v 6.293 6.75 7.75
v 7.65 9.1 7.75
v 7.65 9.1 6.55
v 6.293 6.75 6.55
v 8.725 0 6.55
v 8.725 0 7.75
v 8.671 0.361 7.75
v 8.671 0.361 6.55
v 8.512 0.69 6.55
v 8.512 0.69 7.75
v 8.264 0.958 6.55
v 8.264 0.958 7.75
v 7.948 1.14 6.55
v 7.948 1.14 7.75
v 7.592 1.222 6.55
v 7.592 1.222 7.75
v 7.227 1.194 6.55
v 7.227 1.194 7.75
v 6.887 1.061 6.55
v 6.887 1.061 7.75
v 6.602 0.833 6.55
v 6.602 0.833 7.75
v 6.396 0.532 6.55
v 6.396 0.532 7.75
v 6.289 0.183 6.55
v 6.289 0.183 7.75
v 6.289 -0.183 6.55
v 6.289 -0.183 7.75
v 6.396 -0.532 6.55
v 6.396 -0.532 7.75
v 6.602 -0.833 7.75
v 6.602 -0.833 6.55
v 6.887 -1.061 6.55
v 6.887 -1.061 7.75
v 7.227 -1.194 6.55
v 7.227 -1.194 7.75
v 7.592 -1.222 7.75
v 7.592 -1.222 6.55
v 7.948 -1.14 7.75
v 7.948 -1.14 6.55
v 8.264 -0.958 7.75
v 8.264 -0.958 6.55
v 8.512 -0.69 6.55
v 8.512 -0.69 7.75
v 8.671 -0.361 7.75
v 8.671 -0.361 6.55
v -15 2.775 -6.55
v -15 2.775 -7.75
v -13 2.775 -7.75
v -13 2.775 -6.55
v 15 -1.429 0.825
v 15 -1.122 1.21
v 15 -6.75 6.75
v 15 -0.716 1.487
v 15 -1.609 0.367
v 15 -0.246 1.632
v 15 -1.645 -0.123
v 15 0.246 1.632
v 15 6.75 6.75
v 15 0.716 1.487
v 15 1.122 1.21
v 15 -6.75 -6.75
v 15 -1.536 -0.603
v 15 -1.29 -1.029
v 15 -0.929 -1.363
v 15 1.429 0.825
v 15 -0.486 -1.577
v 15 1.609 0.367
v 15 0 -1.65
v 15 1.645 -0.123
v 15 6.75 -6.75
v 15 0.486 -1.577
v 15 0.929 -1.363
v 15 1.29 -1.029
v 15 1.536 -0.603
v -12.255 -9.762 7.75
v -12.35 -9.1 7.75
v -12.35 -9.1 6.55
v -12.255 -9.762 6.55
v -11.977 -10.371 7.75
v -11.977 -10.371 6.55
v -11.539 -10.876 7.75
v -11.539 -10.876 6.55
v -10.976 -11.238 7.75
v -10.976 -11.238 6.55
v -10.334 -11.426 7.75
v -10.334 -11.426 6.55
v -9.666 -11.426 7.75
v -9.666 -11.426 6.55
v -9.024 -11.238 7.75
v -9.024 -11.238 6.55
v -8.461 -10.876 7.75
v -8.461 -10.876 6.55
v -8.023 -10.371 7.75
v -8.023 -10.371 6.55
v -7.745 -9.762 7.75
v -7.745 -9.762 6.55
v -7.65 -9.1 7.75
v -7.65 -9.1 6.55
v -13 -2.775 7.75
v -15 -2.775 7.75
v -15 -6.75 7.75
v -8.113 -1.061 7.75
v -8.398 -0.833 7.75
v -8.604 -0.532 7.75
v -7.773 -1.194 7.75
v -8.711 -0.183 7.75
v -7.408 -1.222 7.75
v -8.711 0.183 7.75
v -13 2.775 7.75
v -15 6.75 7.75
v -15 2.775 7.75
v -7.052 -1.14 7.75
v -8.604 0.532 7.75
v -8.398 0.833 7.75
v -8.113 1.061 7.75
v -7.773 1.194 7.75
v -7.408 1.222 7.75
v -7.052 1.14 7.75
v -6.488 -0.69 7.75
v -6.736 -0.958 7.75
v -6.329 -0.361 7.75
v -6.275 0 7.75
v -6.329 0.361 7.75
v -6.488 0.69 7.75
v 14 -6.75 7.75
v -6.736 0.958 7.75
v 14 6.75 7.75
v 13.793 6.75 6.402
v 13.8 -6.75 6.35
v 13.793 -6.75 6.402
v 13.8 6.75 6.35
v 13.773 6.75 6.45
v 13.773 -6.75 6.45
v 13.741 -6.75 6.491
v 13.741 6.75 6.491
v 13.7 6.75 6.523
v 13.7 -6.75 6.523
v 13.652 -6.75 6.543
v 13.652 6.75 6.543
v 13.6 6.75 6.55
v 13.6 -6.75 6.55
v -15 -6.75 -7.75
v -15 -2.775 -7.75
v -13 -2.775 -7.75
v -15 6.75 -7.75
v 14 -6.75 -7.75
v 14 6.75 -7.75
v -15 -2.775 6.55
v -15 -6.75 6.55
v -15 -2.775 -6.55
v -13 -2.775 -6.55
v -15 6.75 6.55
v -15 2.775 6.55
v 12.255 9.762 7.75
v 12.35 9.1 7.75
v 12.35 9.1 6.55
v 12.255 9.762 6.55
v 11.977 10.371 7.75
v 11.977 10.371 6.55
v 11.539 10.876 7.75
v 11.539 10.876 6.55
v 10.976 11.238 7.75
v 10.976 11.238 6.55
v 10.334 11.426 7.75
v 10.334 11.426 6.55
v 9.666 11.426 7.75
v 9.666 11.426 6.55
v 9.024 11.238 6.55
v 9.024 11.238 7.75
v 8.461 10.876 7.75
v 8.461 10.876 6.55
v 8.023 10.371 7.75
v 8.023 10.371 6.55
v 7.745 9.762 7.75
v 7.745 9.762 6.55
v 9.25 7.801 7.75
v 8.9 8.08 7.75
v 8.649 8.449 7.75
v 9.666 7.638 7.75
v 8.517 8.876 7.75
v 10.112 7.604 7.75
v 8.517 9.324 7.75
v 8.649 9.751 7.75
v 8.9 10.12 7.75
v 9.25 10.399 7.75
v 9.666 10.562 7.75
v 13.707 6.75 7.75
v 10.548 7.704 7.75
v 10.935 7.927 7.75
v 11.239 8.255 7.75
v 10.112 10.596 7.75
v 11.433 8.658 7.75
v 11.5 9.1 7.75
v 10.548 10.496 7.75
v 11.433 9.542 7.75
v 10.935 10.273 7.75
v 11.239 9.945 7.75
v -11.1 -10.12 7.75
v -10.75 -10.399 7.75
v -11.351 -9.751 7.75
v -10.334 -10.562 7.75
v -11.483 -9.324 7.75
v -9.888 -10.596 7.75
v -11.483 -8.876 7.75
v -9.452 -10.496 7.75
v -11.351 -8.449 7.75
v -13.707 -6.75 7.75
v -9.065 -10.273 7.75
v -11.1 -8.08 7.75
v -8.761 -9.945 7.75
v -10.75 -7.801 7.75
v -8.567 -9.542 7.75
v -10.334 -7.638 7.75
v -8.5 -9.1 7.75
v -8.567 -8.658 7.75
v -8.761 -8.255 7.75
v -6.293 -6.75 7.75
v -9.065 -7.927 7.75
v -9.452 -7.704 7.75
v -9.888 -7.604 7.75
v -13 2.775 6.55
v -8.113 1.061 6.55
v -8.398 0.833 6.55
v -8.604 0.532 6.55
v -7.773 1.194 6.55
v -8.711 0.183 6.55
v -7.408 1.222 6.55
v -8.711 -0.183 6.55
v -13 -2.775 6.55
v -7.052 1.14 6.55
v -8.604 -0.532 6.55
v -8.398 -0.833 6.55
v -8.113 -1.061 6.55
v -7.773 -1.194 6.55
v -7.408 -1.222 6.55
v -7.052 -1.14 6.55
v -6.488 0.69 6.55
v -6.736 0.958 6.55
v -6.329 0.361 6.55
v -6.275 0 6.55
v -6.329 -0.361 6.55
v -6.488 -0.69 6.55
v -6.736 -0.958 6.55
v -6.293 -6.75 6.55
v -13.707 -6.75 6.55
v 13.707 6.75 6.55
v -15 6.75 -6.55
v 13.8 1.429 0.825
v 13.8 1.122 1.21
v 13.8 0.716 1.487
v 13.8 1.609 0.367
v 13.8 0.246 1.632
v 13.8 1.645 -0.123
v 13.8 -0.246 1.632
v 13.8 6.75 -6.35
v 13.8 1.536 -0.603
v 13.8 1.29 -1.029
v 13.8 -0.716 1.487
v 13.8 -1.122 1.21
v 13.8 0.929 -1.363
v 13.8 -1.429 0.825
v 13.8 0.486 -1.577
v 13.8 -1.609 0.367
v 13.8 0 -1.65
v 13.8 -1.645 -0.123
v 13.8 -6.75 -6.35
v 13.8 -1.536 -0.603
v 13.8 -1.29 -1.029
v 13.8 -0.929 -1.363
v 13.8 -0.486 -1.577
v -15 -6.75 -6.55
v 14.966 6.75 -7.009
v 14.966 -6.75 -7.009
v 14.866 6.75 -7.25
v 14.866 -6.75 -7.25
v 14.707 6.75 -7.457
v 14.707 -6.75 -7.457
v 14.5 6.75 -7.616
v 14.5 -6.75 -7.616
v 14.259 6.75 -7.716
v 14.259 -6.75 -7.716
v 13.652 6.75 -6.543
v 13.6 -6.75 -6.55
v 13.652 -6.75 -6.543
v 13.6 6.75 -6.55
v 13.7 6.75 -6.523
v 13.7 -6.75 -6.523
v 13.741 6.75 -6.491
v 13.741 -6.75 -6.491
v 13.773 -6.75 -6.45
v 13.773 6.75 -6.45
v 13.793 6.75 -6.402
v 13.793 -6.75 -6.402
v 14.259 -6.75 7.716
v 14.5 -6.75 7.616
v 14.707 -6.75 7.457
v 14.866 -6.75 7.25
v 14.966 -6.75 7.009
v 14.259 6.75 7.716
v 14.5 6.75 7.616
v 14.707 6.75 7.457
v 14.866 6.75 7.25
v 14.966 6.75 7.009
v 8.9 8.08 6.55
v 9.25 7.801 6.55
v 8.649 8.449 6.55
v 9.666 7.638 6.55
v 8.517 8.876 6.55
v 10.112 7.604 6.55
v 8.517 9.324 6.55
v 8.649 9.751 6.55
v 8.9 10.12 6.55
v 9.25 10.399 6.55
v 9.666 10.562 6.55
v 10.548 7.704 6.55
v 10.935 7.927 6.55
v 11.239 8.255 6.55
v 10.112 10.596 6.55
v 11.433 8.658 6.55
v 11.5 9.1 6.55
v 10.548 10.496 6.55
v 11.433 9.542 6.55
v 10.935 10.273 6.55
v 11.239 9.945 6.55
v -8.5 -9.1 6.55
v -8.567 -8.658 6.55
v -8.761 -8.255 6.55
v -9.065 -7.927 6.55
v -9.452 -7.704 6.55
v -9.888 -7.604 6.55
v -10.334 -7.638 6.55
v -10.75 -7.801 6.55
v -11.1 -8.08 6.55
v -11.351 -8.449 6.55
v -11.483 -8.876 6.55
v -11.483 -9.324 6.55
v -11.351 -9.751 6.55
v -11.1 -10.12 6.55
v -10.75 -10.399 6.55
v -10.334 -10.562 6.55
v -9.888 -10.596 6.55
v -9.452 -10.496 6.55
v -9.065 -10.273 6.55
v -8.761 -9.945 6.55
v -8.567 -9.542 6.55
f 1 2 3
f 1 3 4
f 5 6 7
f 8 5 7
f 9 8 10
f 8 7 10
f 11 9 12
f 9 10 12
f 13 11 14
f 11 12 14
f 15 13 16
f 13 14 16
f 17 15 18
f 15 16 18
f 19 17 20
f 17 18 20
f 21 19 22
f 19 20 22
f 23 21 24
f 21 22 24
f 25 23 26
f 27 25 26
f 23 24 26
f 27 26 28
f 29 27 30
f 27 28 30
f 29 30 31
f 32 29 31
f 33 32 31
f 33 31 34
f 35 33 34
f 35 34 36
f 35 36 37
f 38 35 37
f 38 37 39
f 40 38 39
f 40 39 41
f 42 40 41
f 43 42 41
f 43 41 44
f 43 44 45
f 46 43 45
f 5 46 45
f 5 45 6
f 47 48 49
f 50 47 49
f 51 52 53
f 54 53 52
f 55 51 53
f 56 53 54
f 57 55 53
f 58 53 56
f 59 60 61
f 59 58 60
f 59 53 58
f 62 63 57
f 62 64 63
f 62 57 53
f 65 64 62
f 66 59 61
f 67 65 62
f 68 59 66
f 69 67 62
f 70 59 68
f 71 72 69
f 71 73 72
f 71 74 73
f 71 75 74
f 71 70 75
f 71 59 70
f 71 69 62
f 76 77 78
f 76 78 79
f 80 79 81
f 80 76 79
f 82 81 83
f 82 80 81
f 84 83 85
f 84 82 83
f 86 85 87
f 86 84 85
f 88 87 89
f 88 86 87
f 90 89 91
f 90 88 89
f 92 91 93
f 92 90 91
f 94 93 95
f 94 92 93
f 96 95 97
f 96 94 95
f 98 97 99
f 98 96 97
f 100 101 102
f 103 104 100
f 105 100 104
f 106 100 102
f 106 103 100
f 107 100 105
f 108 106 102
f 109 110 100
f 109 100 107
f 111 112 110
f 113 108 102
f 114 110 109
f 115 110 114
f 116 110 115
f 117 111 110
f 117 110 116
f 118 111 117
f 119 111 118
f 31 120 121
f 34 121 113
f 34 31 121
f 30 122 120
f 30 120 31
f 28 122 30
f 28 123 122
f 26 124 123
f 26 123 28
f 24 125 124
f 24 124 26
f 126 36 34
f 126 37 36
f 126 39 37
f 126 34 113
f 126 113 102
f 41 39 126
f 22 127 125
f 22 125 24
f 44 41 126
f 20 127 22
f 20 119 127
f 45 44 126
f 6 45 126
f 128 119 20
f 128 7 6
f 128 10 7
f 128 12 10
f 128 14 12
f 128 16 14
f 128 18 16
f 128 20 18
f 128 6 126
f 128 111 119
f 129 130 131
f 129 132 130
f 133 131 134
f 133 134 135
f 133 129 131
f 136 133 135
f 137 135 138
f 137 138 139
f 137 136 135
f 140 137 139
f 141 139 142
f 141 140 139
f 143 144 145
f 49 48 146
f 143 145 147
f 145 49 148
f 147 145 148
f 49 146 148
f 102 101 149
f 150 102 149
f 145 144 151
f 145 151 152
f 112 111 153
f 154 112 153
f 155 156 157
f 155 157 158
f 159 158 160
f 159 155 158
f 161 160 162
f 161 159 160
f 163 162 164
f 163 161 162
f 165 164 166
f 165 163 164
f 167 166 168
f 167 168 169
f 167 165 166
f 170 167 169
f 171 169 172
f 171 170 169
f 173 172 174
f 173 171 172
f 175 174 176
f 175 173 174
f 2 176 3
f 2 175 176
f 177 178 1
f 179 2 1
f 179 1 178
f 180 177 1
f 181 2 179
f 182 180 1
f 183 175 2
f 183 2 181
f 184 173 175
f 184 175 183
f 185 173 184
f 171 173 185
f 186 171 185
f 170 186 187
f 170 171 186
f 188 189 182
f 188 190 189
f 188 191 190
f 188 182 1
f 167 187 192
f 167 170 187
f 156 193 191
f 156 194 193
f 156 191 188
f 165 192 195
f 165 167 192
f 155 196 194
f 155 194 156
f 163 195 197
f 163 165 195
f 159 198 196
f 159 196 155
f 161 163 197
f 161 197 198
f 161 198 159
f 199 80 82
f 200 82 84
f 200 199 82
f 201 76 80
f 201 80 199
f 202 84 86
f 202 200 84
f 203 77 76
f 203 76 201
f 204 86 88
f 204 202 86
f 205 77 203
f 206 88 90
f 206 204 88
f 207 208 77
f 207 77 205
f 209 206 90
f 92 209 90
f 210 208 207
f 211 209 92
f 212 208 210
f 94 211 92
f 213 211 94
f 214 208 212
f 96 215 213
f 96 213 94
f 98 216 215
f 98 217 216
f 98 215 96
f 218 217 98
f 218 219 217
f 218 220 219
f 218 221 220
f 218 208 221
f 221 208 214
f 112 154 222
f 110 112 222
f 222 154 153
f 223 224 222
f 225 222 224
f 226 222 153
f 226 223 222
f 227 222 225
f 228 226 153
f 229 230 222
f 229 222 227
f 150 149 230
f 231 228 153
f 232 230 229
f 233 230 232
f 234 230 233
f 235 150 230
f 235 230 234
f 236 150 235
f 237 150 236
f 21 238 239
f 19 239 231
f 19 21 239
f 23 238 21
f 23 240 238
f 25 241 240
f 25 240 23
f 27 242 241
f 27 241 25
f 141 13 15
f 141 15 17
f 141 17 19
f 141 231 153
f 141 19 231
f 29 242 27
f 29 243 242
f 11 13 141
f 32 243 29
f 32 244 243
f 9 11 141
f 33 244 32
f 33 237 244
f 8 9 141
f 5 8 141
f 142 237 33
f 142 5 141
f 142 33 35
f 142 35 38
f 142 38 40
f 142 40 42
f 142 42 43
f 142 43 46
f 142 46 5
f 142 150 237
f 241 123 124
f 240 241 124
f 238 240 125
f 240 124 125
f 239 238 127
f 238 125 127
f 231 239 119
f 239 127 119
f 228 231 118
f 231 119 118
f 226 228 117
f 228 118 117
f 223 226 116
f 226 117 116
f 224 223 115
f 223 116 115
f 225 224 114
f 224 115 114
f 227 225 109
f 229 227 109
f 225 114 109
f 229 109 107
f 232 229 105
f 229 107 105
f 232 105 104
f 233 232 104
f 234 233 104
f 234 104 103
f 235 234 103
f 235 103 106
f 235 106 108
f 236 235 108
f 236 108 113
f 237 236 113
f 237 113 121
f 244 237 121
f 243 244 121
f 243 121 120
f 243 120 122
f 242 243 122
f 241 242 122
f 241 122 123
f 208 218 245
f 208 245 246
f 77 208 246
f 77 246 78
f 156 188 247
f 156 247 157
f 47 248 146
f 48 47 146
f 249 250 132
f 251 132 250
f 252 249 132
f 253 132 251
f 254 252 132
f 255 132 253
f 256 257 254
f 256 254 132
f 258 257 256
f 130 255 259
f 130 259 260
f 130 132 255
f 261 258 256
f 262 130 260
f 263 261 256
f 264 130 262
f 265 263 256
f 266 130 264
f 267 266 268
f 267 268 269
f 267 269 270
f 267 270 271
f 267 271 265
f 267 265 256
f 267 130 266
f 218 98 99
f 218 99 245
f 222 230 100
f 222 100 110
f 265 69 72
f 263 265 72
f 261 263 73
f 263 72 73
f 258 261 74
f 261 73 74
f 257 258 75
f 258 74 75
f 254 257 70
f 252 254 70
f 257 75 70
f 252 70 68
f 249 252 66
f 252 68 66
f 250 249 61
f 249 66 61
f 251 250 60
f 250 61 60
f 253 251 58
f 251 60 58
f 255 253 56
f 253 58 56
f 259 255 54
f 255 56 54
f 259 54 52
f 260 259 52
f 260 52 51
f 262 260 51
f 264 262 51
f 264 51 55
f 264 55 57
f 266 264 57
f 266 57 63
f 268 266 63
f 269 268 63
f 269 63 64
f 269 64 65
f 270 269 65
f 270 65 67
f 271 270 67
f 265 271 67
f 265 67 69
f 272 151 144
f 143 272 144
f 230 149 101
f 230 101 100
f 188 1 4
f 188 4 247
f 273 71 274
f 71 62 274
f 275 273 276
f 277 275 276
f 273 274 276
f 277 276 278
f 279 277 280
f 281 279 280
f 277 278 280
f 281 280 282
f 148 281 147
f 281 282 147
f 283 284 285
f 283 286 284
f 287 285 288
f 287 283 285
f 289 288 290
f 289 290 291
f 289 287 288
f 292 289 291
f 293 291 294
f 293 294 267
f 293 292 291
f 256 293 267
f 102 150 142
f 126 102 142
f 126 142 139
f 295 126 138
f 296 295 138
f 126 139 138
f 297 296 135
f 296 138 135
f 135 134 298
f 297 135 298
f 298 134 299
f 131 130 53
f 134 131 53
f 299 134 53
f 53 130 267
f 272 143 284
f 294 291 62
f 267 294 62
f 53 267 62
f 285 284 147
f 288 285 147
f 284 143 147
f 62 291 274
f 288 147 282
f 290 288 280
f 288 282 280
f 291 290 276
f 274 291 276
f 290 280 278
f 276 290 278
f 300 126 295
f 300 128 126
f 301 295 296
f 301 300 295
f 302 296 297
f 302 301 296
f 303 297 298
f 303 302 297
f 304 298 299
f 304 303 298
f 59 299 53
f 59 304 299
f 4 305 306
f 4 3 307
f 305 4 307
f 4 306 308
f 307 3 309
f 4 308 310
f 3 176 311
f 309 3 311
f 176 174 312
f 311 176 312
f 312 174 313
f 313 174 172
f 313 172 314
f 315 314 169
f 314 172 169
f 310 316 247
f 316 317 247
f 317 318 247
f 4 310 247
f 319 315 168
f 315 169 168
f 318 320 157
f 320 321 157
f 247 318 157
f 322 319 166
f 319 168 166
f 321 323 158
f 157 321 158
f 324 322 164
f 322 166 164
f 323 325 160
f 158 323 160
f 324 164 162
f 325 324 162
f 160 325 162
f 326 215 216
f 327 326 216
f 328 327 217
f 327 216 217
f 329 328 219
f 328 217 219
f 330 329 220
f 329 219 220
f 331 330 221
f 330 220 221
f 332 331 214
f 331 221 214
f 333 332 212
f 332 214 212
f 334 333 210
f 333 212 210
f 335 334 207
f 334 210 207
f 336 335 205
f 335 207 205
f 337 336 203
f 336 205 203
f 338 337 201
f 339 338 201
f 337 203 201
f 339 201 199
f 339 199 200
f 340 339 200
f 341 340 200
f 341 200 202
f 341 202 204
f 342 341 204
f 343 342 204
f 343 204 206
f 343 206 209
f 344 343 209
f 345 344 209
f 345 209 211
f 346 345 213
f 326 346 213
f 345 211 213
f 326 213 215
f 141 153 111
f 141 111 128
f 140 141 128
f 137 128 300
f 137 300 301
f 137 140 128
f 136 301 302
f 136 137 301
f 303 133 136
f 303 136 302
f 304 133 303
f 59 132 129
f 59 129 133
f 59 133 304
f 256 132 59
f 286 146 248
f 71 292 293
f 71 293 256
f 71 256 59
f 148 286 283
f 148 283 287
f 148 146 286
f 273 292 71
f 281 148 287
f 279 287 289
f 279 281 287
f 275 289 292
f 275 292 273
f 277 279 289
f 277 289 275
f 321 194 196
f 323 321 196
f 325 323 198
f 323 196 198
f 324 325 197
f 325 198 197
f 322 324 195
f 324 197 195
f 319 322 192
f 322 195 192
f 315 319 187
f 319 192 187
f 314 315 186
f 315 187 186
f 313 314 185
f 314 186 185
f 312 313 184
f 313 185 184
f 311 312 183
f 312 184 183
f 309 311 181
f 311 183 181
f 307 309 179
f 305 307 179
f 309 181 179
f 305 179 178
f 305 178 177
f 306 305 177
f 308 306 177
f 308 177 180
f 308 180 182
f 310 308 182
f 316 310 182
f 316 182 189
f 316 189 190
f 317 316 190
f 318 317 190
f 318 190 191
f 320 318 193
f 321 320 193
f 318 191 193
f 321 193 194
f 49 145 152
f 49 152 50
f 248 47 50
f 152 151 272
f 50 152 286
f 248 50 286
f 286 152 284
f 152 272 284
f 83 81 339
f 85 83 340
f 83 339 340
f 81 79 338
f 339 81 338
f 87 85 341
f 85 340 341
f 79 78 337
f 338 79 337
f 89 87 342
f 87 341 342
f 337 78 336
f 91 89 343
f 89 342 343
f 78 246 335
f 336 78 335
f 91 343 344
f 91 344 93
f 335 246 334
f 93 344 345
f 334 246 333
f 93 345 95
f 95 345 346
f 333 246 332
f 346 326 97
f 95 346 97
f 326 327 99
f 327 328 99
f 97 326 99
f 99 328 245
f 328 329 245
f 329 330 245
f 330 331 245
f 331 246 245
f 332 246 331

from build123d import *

# Parameters (mm, degrees)
CROQUIS1_W                 = 30
CROQUIS1_H                 = 15.5
SALIENTE_EXTRUIR1_DEPTH    = 6.75
CORTAR_EXTRUIR1_DEPTH      = 19.183096546
CORTAR_EXTRUIR1_DEPTH_BACK = 19.183096546
CROQUIS2_W                 = 28.8
CROQUIS2_H                 = 13.1
CORTAR_EXTRUIR2_REACH      = 33.712
CROQUIS3_R                 = 1.65
REDONDEO1_R                = 1
REDONDEO2_R                = 0.2
CORTAR_EXTRUIR3_DEPTH      = 19.183096546
CORTAR_EXTRUIR3_DEPTH_BACK = 19.183096546
CROQUIS4_W                 = 2
CROQUIS4_H                 = 5.55
CORTAR_EXTRUIR4_REACH      = 24.601
CROQUIS5_R                 = 1.225
SKETCH1_R                  = 2.35
SKETCH1_R_2                = 1.5
BOSS_EXTRUDE2_DEPTH        = 1.2


with BuildPart() as part:
    # Croquis1 → Saliente-Extruir1 (new, symmetric)
    with BuildSketch(Plane(origin=(0, 0, 0), x_dir=(1, 0, 0), z_dir=(0, 1, 0))):
        Rectangle(CROQUIS1_W, CROQUIS1_H)
    extrude(amount=SALIENTE_EXTRUIR1_DEPTH, both=True)

    # Croquis2 → Cortar-Extruir1 (cut, two sides: drawn at the far end of the back side and taken through both)
    with BuildSketch(Plane(origin=(0, 0, 0), x_dir=(1, 0, 0), z_dir=(0, 1, 0)).offset(-CORTAR_EXTRUIR1_DEPTH_BACK)):
        with Locations((-0.6, 0)):
            Rectangle(CROQUIS2_W, CROQUIS2_H)
    extrude(amount=CORTAR_EXTRUIR1_DEPTH + CORTAR_EXTRUIR1_DEPTH_BACK, mode=Mode.SUBTRACT)

    # Croquis3 → Cortar-Extruir2 (cut, up to next)
    with BuildSketch(Plane(origin=(15, 0, 0), x_dir=(0, 0, -1), z_dir=(1, 0, 0)), mode=Mode.PRIVATE) as cortar_extruir2_sk1:
        Circle(CROQUIS3_R)
    cortar_extruir2_tool1 = extrude(cortar_extruir2_sk1.sketch, amount=-CORTAR_EXTRUIR2_REACH, mode=Mode.PRIVATE) & part.part
    add(cortar_extruir2_tool1.solids().sort_by_distance((15, 0, 0))[0], mode=Mode.SUBTRACT)

    # Redondeo1
    redondeo1_edges = [part.edges().sort_by_distance(p)[0] for p in [
        (15, 0, -7.75),
        (15, 0, 7.75),
    ]]
    fillet(redondeo1_edges, radius=REDONDEO1_R)

    # Redondeo2
    redondeo2_edges = [part.edges().sort_by_distance(p)[0] for p in [
        (13.8, 0, -6.55),
        (13.8, 0, 6.55),
    ]]
    fillet(redondeo2_edges, radius=REDONDEO2_R)

    # Croquis4 → Cortar-Extruir3 (cut, two sides: drawn at the far end of the back side and taken through both)
    with BuildSketch(Plane.XY.offset(-CORTAR_EXTRUIR3_DEPTH_BACK)):
        with Locations((-14, 0)):
            Rectangle(CROQUIS4_W, CROQUIS4_H)
    extrude(amount=CORTAR_EXTRUIR3_DEPTH + CORTAR_EXTRUIR3_DEPTH_BACK, mode=Mode.SUBTRACT)

    # Croquis5 → Cortar-Extruir4 (cut, up to next)
    with BuildSketch(Plane.XY.offset(7.75), mode=Mode.PRIVATE) as cortar_extruir4_sk1:
        with Locations((-7.5, 0)):
            Circle(CROQUIS5_R)
    cortar_extruir4_tool1 = extrude(cortar_extruir4_sk1.sketch, amount=-CORTAR_EXTRUIR4_REACH, mode=Mode.PRIVATE) & part.part
    # Croquis5 → Cortar-Extruir4 (cut, up to next)
    with BuildSketch(Plane.XY.offset(7.75), mode=Mode.PRIVATE) as cortar_extruir4_sk2:
        with Locations((7.5, 0)):
            Circle(CROQUIS5_R)
    cortar_extruir4_tool2 = extrude(cortar_extruir4_sk2.sketch, amount=-CORTAR_EXTRUIR4_REACH, mode=Mode.PRIVATE) & part.part
    add(cortar_extruir4_tool1.solids().sort_by_distance((-7.5, 0, 7.75))[0], mode=Mode.SUBTRACT)
    add(cortar_extruir4_tool2.solids().sort_by_distance((7.5, 0, 7.75))[0], mode=Mode.SUBTRACT)


with BuildPart() as body_2:
    # Sketch1 → Boss-Extrude2 (new body)
    # profile 1 of 6: a face of its own
    with BuildSketch(Plane.XY.offset(7.75)):
        with Locations((10, 9.1)):
            Circle(SKETCH1_R)
        with Locations((10, 9.1)):
            Circle(SKETCH1_R_2, mode=Mode.SUBTRACT)
    # profile 2 of 6: a face of its own
    with BuildSketch(Plane.XY.offset(7.75)):
        with BuildLine():
            Line((13.706773133, 6.75), (12.35, 9.1))
            ThreePointArc((12.35, 9.1), (11.661700931, 7.438299059), (9.999999986, 6.75))
            Line((9.999999986, 6.75), (13.706773133, 6.75))
        make_face()
    # profile 3 of 6: a face of its own
    with BuildSketch(Plane.XY.offset(7.75)):
        with BuildLine():
            ThreePointArc((9.999999986, 6.75), (8.338299059, 7.438299069), (7.65, 9.1))
            Line((7.65, 9.1), (6.293226867, 6.75))
            Line((6.293226867, 6.75), (9.999999986, 6.75))
        make_face()
    # profile 4 of 6: a face of its own
    with BuildSketch(Plane.XY.offset(7.75)):
        with BuildLine():
            ThreePointArc((-10, -6.75), (-8.338299064, -7.438299064), (-7.65, -9.1))
            Line((-7.65, -9.1), (-6.293226867, -6.75))
            Line((-6.293226867, -6.75), (-10, -6.75))
        make_face()
    # profile 5 of 6: a face of its own
    with BuildSketch(Plane.XY.offset(7.75)):
        with Locations((-10, -9.1)):
            Circle(SKETCH1_R)
        with Locations((-10, -9.1)):
            Circle(SKETCH1_R_2, mode=Mode.SUBTRACT)
    # profile 6 of 6: a face of its own
    with BuildSketch(Plane.XY.offset(7.75)):
        with BuildLine():
            Line((-13.706773133, -6.75), (-12.35, -9.1))
            ThreePointArc((-12.35, -9.1), (-11.661700936, -7.438299064), (-10, -6.75))
            Line((-10, -6.75), (-13.706773133, -6.75))
        make_face()
    extrude(amount=-BOSS_EXTRUDE2_DEPTH)


solid = Compound([part.part, body_2.part])
